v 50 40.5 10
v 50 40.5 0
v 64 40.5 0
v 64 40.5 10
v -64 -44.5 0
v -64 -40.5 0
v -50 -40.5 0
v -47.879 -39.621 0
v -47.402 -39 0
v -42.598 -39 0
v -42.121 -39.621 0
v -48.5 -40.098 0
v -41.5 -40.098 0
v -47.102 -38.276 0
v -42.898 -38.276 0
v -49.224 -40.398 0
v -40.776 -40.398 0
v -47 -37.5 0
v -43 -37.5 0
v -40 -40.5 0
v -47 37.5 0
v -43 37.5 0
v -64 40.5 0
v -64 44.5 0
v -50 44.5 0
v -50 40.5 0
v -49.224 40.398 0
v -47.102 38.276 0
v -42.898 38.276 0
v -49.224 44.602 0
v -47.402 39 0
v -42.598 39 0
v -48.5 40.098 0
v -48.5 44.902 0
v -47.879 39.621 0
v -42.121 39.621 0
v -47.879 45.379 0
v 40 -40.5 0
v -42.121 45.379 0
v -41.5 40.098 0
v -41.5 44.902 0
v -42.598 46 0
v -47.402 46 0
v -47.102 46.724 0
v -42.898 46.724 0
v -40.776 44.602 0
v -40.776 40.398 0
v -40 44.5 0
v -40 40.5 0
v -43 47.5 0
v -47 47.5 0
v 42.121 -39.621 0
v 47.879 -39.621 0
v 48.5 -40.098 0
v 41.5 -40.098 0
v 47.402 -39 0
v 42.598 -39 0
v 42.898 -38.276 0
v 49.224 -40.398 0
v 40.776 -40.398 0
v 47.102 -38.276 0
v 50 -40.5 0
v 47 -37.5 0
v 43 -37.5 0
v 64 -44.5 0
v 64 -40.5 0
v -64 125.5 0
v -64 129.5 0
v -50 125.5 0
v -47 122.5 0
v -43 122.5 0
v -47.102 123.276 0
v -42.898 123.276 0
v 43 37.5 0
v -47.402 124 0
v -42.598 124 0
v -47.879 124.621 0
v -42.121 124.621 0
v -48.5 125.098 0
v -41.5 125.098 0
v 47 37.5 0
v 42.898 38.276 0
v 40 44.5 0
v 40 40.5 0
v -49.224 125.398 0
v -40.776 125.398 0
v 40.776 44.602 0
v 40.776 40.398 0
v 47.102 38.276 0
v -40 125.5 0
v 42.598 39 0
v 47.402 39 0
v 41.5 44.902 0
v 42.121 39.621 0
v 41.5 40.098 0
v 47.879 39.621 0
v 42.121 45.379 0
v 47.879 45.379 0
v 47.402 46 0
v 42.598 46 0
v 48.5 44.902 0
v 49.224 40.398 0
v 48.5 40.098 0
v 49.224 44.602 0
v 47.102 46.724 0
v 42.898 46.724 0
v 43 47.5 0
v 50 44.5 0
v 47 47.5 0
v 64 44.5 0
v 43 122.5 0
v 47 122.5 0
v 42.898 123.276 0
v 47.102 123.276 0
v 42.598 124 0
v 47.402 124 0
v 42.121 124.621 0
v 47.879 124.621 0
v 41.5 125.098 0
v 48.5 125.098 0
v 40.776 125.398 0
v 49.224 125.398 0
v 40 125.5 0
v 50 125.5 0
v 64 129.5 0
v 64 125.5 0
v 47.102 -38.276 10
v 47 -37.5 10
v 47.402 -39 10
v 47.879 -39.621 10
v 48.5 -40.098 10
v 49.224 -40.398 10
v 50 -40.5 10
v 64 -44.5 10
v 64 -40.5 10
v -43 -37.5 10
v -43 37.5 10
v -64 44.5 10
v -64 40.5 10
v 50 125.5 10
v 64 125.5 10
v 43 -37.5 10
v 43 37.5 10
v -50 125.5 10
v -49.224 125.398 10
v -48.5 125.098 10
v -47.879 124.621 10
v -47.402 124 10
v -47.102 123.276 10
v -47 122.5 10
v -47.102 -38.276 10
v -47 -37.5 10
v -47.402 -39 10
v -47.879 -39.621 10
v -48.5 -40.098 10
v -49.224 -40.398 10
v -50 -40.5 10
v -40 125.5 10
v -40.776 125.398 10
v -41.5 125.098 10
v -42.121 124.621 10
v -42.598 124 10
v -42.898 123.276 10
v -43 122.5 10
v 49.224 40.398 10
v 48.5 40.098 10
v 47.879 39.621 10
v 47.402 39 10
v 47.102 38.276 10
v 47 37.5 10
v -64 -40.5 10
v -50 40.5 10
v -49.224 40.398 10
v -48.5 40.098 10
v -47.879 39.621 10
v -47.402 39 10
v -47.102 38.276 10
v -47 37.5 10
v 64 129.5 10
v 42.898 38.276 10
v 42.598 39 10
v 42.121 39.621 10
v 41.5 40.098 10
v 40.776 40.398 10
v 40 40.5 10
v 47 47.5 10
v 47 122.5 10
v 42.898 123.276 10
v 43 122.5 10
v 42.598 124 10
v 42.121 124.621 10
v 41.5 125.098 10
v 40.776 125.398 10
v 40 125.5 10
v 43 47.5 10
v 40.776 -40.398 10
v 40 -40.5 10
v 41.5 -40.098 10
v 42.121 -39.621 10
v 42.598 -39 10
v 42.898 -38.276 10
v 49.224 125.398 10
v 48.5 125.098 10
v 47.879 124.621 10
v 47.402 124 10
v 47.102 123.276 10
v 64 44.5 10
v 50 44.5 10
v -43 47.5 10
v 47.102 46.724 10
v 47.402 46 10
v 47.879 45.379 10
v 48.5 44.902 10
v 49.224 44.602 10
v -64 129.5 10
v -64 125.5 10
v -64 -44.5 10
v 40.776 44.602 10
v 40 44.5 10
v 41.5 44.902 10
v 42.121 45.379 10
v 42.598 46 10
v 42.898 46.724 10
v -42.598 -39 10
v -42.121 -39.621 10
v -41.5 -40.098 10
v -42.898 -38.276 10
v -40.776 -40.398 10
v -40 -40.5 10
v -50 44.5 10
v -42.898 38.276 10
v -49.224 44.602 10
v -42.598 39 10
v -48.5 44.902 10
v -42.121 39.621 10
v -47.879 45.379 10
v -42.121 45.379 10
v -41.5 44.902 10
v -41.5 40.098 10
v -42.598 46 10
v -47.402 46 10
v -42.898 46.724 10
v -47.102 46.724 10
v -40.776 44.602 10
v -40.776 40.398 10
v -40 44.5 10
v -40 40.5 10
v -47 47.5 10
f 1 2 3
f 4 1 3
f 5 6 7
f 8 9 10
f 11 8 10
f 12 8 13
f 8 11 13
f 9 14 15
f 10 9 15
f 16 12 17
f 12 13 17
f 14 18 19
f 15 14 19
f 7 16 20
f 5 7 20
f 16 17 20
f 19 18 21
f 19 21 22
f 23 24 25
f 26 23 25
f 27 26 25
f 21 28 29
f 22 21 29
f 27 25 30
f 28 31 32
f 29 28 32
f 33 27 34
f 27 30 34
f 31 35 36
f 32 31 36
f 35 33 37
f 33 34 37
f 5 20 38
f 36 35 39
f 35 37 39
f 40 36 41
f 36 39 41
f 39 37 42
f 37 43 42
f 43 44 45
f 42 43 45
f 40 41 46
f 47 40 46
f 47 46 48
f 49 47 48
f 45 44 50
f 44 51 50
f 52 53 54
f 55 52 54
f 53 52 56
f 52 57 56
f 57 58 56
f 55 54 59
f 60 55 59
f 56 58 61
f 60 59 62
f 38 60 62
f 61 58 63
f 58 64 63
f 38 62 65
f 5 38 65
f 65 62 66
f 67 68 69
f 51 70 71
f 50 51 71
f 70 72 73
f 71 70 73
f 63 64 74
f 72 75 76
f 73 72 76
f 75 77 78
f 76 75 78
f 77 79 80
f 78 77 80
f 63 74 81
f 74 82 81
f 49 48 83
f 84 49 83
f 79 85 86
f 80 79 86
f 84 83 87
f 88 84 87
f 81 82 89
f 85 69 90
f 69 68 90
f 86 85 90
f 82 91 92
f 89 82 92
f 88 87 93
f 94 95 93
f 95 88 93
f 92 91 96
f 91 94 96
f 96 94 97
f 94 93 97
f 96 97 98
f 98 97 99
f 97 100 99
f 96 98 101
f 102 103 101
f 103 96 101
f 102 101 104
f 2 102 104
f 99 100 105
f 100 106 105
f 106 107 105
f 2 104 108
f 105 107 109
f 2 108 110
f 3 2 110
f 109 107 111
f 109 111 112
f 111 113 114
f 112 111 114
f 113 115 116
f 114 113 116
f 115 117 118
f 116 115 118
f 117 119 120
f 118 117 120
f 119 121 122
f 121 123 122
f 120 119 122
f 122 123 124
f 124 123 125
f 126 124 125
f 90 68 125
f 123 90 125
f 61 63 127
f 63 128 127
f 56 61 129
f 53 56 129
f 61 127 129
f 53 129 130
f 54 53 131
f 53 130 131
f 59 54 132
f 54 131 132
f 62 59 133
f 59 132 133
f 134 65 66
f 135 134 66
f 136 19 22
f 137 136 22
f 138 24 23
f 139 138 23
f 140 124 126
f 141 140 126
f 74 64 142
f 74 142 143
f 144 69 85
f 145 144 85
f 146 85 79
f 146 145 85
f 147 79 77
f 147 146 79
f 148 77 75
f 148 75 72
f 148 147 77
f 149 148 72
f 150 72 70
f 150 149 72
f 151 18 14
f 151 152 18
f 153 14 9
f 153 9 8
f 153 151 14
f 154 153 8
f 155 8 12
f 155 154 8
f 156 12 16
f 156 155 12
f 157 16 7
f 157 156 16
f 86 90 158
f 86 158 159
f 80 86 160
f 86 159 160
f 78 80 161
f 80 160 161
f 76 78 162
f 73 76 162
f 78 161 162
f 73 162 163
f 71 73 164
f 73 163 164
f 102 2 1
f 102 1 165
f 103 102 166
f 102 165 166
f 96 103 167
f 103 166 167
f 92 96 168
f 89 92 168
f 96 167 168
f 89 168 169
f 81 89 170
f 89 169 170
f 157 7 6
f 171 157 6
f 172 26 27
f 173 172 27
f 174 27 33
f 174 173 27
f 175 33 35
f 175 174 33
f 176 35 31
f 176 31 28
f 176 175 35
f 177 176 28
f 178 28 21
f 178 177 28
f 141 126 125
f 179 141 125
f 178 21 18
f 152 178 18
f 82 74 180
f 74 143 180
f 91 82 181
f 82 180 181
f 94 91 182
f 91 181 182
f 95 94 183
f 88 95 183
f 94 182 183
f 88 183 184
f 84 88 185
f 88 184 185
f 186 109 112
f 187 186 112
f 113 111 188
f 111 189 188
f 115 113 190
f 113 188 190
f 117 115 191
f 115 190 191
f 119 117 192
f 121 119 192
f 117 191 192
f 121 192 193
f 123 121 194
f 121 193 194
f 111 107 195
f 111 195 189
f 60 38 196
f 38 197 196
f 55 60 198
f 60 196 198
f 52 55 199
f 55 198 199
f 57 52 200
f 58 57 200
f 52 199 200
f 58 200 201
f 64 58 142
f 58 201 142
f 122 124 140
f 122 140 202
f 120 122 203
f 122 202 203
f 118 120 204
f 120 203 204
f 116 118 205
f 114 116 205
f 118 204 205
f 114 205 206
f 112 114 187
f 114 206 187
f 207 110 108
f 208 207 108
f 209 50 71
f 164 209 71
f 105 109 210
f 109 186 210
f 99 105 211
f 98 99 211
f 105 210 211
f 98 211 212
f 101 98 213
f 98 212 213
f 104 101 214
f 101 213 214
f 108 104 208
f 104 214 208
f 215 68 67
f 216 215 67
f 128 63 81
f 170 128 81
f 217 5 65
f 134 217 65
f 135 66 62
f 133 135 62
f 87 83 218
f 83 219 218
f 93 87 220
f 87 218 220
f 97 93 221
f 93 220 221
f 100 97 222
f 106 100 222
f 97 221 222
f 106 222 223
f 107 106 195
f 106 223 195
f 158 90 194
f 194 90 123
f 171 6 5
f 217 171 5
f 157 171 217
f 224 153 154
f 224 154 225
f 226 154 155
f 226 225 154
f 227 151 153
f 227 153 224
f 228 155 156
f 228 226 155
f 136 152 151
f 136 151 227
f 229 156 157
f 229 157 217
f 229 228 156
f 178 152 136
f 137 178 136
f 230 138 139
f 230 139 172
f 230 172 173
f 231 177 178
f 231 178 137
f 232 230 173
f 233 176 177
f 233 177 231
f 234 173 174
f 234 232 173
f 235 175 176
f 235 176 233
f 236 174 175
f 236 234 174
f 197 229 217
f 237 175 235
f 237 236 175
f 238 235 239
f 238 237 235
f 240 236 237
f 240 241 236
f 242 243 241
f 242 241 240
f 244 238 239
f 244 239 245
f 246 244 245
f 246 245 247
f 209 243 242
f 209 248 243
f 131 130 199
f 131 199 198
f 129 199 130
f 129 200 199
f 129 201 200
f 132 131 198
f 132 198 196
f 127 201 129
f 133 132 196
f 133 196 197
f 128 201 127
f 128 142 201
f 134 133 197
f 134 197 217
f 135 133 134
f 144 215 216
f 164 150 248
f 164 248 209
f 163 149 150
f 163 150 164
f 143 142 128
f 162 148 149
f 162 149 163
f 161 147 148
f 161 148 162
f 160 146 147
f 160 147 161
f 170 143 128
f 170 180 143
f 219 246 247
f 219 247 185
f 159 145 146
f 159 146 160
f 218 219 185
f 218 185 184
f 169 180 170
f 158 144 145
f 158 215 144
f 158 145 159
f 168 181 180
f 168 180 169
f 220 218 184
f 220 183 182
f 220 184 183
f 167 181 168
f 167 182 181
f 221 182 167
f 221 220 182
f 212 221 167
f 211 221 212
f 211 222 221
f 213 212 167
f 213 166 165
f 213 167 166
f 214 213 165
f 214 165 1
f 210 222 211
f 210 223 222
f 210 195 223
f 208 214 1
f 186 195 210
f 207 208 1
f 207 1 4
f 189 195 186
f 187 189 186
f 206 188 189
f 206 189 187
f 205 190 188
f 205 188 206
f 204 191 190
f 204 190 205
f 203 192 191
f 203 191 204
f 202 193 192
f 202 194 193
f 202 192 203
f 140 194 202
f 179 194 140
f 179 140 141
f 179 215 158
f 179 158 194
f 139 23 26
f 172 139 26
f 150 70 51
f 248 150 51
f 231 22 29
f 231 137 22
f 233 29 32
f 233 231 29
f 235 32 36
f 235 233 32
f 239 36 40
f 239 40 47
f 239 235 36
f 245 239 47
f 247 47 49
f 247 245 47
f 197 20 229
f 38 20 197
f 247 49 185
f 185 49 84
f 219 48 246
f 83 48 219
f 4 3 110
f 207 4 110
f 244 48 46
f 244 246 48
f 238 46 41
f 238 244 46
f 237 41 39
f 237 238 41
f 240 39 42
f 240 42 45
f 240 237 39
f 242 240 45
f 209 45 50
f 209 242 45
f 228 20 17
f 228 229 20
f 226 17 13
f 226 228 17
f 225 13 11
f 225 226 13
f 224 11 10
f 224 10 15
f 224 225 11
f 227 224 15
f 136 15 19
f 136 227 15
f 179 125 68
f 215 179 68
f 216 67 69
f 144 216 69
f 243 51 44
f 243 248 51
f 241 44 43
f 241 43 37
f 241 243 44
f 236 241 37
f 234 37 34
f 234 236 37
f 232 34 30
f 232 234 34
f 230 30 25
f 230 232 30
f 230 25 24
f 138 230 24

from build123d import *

# Parameters (mm, degrees)
SKETCH1_W           = 86
SKETCH1_H           = 81
BOSS_EXTRUDE1_DEPTH = 10
FILLET1_R           = 3


with BuildPart() as part:
    # Sketch1 → Boss-Extrude1 (new body)
    with BuildSketch(Plane.XY):
        Polygon((-64, 129.5), (-64, 125.5), (-47, 125.5), (-47, 44.5), (-64, 44.5), (-64, 40.5), (-47, 40.5), (-47, -40.5), (-64, -40.5), (-64, -44.5), (0, -44.5), (64, -44.5), (64, -40.5), (47, -40.5), (47, 40.5), (64, 40.5), (64, 44.5), (47, 44.5), (47, 125.5), (64, 125.5), (64, 129.5), (0, 129.5), align=None)
        Rectangle(SKETCH1_W, SKETCH1_H, mode=Mode.SUBTRACT)
        with Locations((0, 85)):
            Rectangle(SKETCH1_W, SKETCH1_H, mode=Mode.SUBTRACT)
    extrude(amount=BOSS_EXTRUDE1_DEPTH)

    # Fillet1
    fillet1_edges = [part.edges().sort_by_distance(p)[0] for p in [
        (-43, -40.5, 5),
        (43, -40.5, 5),
        (43, 40.5, 5),
        (-43, 40.5, 5),
        (-47, 44.5, 5),
        (-47, 125.5, 5),
        (47, 125.5, 5),
        (47, 44.5, 5),
        (47, 40.5, 5),
        (47, -40.5, 5),
        (-47, -40.5, 5),
        (-47, 40.5, 5),
        (43, 44.5, 5),
        (43, 125.5, 5),
        (-43, 125.5, 5),
        (-43, 44.5, 5),
    ]]
    fillet(fillet1_edges, radius=FILLET1_R)


solid = part.part
